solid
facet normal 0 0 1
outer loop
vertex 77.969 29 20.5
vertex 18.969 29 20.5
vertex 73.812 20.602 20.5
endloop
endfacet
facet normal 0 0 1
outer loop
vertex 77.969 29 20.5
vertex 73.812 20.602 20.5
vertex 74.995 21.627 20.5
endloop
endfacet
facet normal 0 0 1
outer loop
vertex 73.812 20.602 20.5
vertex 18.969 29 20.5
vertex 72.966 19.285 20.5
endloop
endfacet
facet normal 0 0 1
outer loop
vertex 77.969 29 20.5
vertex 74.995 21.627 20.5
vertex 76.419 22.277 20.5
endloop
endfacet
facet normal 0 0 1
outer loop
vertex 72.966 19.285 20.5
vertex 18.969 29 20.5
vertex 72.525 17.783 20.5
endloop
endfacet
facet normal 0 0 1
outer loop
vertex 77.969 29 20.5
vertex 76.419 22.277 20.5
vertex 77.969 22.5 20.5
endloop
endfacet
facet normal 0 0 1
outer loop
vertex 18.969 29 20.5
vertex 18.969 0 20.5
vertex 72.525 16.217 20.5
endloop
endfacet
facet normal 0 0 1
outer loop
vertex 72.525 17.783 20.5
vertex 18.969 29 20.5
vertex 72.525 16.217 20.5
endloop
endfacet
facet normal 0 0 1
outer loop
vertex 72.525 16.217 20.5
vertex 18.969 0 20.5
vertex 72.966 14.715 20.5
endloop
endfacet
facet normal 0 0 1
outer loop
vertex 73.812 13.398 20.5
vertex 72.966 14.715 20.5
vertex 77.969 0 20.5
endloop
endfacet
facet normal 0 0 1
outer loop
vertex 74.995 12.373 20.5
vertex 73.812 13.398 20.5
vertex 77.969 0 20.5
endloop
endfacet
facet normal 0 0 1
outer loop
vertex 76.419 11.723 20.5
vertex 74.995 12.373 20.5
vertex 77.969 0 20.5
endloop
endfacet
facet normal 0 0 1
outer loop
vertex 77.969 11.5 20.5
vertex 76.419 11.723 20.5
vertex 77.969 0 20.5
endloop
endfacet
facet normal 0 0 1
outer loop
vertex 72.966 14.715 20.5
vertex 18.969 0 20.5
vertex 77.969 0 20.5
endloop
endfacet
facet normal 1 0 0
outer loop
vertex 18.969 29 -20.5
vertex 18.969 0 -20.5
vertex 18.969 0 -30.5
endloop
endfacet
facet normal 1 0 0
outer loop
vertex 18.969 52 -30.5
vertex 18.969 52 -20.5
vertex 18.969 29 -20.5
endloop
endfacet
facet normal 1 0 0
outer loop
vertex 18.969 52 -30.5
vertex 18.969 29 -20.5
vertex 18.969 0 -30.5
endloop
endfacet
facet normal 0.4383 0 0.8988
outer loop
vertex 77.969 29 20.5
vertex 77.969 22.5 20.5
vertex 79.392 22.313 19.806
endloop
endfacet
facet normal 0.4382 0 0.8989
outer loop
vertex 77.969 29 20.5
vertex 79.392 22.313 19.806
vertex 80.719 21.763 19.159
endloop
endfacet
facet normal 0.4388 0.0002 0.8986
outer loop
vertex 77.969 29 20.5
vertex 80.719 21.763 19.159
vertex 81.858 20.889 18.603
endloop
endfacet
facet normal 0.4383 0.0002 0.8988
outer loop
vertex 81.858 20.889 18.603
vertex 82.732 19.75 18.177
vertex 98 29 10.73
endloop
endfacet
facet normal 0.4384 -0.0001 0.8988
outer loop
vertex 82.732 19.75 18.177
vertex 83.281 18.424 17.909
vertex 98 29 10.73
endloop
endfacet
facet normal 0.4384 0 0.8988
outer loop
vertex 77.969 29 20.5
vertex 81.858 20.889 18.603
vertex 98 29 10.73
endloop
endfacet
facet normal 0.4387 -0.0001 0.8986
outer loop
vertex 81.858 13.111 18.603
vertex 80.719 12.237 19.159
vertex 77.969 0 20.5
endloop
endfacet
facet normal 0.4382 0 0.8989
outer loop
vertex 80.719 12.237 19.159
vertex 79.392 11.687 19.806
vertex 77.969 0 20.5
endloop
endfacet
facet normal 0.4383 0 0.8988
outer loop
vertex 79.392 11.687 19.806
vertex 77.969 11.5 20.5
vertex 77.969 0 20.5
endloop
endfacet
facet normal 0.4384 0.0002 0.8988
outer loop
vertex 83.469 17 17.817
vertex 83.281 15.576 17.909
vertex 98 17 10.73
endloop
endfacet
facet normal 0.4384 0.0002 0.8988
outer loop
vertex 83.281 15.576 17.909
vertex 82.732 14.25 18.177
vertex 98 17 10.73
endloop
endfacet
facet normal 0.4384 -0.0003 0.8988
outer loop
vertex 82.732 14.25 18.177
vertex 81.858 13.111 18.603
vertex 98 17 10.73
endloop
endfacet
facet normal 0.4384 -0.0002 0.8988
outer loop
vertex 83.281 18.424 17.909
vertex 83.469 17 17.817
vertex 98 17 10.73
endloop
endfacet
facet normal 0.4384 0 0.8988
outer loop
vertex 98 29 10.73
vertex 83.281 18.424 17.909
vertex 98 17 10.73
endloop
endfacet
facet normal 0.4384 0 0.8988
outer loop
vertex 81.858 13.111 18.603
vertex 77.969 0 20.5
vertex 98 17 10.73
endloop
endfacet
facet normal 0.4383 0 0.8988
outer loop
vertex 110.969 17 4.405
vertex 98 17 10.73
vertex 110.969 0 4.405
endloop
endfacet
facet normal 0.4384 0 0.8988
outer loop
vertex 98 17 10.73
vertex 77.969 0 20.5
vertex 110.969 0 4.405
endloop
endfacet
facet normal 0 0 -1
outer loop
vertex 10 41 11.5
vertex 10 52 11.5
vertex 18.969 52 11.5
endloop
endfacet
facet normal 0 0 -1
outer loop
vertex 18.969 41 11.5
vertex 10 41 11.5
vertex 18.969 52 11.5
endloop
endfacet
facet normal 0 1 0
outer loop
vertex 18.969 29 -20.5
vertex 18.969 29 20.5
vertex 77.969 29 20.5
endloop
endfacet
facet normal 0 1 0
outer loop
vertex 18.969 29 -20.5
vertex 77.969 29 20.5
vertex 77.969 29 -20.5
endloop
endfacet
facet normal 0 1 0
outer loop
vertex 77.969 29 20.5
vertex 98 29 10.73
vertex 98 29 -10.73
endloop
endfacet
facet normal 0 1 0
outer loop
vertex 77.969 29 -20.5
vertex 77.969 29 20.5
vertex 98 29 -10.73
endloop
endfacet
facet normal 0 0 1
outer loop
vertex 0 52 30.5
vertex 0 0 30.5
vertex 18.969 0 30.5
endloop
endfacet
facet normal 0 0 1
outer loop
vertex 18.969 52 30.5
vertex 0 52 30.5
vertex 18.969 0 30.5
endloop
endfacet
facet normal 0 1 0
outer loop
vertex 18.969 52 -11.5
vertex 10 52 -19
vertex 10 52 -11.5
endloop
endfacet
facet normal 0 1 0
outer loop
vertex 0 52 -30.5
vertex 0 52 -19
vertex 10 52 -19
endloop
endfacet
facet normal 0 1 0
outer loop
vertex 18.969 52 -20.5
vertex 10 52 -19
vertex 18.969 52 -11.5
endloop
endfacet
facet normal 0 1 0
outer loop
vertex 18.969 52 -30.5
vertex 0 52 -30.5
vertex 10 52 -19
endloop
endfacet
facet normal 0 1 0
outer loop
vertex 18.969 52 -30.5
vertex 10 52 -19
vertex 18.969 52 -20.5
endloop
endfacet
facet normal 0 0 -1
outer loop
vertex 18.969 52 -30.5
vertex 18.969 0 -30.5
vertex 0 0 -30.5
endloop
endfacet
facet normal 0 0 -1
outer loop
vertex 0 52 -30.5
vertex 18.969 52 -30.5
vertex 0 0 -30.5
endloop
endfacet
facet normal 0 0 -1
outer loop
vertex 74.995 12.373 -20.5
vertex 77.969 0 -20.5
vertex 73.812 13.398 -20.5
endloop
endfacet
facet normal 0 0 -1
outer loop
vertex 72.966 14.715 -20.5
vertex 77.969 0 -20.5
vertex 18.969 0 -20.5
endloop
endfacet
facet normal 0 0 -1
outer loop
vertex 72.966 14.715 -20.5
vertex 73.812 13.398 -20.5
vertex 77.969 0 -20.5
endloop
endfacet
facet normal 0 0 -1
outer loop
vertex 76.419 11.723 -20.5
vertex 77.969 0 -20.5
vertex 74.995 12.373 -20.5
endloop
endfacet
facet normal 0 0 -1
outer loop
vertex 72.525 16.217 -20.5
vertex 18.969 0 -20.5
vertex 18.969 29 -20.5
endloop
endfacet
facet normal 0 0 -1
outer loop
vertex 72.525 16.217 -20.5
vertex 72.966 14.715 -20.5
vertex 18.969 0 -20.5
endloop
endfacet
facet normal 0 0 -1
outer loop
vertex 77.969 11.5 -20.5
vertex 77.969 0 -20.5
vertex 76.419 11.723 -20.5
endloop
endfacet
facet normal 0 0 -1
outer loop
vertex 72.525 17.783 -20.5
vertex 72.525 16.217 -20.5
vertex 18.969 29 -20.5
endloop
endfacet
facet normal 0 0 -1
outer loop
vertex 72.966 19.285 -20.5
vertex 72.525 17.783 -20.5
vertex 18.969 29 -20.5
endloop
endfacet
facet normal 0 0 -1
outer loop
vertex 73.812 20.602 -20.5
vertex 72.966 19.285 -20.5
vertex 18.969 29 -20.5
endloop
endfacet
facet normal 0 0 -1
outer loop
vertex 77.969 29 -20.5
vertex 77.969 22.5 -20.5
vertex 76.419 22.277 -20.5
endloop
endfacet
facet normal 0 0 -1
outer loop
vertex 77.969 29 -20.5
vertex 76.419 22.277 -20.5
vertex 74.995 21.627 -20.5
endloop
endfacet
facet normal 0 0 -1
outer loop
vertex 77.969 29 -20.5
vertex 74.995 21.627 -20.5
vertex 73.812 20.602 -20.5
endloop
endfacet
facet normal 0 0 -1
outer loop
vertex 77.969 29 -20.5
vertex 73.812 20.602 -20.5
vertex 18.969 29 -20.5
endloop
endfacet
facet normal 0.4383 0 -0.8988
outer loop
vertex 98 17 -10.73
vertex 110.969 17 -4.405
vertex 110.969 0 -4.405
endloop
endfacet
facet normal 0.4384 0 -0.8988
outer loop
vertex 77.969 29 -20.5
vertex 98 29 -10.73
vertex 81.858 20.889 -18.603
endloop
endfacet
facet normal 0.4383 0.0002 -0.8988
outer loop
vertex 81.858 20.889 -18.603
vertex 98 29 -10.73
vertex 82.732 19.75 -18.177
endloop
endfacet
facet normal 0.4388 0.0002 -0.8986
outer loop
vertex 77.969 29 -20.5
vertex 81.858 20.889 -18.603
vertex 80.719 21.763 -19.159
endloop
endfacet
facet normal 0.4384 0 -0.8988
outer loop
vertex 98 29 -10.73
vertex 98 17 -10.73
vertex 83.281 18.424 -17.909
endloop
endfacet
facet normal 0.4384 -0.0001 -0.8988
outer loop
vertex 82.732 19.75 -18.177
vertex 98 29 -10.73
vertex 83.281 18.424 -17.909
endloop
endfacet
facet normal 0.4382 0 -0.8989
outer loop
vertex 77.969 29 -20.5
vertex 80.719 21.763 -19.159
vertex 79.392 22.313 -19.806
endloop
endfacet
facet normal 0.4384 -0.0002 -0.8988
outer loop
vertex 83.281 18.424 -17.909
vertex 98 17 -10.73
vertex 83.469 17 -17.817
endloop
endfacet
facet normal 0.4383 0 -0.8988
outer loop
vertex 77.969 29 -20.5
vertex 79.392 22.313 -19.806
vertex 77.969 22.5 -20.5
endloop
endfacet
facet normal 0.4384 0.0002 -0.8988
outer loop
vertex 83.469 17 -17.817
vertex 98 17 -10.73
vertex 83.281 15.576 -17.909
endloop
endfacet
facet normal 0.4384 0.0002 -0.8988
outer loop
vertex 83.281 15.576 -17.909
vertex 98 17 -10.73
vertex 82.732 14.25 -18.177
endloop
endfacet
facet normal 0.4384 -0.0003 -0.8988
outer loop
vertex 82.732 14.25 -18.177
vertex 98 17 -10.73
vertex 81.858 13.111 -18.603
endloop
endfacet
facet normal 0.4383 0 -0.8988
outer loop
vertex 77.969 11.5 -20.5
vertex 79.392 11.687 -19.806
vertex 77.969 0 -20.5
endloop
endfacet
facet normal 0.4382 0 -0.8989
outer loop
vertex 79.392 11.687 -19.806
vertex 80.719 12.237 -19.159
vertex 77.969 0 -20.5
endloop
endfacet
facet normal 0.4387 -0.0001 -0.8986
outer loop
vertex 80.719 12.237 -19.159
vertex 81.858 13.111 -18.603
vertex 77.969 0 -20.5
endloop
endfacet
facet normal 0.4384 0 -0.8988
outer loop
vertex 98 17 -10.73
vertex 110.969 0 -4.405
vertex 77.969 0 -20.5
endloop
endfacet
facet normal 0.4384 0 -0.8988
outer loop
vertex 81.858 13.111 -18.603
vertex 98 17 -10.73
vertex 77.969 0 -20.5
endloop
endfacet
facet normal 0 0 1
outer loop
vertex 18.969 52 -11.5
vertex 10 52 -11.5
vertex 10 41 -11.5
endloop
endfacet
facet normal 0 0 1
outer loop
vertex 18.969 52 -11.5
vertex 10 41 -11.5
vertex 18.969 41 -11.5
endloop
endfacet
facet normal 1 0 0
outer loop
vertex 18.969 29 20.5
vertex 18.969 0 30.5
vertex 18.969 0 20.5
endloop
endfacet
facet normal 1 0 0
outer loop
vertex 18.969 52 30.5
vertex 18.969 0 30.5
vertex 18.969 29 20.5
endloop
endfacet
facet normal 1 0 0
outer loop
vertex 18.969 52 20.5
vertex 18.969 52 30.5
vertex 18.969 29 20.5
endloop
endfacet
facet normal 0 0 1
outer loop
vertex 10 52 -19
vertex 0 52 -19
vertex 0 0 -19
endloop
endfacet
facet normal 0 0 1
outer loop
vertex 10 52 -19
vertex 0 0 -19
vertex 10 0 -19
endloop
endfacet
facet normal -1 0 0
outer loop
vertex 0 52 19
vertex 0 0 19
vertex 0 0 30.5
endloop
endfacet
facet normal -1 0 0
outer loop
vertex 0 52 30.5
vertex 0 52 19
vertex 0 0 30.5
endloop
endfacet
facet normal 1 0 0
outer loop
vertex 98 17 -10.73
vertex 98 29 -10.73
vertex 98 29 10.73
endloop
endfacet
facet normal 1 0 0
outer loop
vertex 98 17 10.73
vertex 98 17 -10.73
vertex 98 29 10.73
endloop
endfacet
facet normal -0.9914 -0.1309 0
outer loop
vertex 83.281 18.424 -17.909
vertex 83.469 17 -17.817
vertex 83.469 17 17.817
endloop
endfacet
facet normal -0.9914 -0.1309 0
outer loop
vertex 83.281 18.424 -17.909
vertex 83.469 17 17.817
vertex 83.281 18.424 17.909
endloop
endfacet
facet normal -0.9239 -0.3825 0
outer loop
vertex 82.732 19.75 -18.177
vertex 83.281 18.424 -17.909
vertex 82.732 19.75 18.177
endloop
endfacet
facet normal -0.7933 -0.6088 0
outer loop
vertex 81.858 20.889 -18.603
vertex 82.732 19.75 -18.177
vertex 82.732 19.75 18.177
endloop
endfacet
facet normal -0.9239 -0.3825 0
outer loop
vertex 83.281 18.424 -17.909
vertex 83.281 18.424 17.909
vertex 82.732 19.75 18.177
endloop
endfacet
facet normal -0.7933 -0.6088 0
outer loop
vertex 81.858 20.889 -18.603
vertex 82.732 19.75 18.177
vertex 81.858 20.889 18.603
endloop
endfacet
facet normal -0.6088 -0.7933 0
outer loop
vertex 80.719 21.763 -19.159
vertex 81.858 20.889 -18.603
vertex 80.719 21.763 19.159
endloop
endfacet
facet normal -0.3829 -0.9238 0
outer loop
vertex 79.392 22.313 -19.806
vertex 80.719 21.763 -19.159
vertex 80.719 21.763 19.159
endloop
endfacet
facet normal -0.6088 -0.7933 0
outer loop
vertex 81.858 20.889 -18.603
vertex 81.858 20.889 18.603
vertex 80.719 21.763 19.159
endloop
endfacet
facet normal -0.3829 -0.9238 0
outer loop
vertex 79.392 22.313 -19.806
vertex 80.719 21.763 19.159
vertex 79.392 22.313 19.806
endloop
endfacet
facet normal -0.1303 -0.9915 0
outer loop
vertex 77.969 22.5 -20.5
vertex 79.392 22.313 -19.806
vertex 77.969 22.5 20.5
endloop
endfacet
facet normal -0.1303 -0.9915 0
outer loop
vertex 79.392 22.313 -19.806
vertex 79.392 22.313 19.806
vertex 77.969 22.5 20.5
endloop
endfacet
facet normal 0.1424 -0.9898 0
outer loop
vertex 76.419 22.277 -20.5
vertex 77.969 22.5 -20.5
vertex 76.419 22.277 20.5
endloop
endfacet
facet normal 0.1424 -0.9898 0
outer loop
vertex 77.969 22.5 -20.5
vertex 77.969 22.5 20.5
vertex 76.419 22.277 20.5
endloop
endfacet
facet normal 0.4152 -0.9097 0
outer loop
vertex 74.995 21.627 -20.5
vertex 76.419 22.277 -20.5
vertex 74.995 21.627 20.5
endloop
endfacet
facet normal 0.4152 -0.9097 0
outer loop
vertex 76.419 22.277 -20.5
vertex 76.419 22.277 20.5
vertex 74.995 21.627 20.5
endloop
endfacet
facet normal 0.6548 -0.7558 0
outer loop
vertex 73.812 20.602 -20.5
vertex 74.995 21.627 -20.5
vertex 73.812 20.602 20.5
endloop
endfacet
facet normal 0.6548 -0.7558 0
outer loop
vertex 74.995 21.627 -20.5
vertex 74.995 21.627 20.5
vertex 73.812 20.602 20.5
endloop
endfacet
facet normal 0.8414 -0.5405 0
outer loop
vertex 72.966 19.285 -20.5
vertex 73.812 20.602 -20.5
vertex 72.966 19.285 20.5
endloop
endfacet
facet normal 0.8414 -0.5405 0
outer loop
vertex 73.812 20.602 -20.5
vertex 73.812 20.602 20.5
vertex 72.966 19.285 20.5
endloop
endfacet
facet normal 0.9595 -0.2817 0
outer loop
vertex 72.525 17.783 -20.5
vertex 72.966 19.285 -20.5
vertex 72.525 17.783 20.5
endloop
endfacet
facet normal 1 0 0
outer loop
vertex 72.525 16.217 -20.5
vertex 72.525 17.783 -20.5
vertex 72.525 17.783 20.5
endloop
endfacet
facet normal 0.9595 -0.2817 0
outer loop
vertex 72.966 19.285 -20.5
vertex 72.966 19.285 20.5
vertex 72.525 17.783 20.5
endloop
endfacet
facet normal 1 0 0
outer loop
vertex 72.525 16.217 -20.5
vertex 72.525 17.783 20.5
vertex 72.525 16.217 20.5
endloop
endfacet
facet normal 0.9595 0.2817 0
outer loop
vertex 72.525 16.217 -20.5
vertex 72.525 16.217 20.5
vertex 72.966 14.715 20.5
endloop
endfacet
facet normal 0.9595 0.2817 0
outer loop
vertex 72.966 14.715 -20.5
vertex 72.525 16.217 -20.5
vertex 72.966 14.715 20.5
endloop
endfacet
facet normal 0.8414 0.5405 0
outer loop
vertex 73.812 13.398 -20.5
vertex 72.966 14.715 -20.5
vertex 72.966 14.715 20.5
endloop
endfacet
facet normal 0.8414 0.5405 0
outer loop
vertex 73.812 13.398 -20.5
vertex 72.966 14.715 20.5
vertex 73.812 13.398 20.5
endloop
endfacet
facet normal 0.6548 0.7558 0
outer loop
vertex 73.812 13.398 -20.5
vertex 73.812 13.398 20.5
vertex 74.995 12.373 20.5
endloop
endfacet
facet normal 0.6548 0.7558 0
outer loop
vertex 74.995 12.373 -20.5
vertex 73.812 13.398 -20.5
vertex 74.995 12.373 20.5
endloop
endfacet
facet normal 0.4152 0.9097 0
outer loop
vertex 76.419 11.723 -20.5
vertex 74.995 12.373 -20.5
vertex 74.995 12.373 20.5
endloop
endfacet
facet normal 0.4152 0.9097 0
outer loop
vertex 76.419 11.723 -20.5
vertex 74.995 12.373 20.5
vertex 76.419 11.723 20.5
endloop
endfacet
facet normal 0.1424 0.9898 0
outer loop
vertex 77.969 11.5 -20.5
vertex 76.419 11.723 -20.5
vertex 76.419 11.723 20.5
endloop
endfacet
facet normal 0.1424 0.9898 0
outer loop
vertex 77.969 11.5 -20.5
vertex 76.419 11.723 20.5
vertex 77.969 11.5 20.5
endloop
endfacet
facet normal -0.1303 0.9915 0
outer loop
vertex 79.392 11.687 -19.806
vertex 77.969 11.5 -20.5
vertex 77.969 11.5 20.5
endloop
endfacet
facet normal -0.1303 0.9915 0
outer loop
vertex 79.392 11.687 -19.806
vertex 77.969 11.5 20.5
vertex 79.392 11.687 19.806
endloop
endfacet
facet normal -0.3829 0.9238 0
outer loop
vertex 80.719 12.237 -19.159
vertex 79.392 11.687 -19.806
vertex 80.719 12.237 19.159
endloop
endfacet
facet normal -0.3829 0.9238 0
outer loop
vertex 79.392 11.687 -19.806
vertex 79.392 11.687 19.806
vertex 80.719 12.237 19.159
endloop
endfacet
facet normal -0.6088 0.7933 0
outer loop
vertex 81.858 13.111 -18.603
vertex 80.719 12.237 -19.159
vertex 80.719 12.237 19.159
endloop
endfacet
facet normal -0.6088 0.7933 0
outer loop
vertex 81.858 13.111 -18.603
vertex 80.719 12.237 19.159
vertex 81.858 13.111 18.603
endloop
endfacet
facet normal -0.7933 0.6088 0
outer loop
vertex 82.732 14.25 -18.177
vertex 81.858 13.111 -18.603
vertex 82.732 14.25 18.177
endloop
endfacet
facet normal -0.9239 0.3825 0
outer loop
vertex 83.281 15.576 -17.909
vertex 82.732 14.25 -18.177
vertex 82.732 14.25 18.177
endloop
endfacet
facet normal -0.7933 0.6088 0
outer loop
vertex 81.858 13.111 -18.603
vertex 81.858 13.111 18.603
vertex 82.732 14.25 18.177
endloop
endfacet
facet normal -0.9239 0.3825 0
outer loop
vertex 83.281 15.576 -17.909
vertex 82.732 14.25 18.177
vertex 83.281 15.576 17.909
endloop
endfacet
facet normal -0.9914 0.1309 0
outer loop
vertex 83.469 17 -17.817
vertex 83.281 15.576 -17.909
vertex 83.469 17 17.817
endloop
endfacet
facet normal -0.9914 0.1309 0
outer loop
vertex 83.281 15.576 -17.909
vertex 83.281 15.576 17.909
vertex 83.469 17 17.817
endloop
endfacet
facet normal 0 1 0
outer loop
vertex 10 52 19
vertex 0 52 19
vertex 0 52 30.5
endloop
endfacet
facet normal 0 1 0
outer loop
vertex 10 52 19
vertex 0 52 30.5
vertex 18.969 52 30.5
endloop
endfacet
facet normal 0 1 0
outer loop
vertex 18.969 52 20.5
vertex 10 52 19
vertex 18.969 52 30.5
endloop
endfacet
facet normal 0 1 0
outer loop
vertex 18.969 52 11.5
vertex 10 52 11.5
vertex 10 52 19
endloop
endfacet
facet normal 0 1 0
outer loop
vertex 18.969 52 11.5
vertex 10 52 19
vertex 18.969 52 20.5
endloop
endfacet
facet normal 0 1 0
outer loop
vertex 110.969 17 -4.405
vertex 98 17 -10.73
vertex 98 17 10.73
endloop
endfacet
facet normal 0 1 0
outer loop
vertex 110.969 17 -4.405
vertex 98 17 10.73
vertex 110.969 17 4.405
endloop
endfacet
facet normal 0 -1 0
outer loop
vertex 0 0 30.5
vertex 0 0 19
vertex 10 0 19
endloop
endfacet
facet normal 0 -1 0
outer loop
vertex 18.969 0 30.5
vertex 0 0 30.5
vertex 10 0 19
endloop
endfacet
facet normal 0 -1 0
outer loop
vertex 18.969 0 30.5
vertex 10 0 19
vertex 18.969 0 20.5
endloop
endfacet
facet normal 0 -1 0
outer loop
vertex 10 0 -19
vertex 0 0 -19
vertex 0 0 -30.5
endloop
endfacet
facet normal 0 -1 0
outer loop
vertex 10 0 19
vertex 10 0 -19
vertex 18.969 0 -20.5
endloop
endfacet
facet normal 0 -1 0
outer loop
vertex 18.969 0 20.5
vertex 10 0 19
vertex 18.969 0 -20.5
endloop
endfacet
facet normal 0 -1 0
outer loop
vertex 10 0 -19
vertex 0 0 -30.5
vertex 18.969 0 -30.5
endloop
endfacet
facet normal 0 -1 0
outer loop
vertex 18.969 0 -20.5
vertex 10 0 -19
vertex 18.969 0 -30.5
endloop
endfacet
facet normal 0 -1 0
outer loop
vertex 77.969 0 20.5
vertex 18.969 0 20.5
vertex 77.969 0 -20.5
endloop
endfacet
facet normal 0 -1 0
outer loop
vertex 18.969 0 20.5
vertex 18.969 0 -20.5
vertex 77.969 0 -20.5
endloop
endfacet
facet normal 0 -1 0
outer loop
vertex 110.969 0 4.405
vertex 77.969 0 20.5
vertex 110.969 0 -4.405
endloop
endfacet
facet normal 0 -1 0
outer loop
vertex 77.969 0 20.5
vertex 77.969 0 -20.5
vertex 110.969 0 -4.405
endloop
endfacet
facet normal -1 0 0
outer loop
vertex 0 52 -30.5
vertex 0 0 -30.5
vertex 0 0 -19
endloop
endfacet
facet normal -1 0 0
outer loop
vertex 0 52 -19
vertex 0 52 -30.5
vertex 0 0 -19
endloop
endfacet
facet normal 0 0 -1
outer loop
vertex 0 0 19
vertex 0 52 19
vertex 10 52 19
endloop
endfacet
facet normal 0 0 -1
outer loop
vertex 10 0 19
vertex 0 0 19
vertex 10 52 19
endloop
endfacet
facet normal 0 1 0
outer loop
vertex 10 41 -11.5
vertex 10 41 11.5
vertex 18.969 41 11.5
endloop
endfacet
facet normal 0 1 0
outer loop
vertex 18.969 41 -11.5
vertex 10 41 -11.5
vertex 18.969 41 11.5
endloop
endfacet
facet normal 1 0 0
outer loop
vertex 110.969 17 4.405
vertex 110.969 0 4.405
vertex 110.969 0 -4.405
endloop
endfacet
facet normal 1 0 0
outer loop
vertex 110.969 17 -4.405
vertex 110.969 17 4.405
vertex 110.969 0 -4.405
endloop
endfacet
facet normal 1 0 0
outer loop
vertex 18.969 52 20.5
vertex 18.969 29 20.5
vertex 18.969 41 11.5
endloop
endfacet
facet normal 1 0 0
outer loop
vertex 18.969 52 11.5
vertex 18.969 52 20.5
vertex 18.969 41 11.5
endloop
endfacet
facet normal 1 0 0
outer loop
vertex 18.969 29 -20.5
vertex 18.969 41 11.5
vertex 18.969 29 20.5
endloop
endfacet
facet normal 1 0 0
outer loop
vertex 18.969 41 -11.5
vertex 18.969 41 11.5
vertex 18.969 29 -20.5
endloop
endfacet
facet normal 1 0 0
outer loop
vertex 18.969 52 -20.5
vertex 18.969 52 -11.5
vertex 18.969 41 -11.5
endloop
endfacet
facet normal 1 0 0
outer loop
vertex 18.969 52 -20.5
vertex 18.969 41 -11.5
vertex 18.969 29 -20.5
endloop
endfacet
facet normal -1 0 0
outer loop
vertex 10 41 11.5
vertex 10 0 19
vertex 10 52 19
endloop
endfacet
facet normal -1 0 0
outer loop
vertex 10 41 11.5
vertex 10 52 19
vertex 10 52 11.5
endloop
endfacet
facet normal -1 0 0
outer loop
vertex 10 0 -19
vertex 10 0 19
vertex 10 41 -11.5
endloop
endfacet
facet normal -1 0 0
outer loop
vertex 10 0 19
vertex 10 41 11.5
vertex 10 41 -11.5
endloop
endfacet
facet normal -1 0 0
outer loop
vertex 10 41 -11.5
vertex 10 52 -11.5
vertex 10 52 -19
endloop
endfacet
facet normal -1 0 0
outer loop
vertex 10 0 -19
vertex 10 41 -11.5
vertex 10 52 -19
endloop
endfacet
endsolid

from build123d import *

# Parameters (mm, degrees)
BOSS_EXTRUDE1_DEPTH = 52
SKETCH2_W           = 41
SKETCH2_H           = 23
CUT_EXTRUDE1_DEPTH  = 92
SKETCH3_W           = 10
SKETCH3_H           = 52
CUT_EXTRUDE2_DEPTH  = 9.031229
CUT_EXTRUDE3_DEPTH  = 35
SKETCH5_W           = 20
SKETCH5_H           = 38
CUT_EXTRUDE4_DEPTH  = 62
SKETCH6_W           = 9.816407164
SKETCH6_H           = 23
CUT_EXTRUDE5_DEPTH  = 11
SKETCH8_R           = 5.5
CUT_EXTRUDE6_DEPTH  = 52


with BuildPart() as part:
    # Sketch1 → Boss-Extrude1 (new body)
    with BuildSketch(Plane(origin=(0, 0, 0), x_dir=(1, 0, 0), z_dir=(0, 1, 0))):
        Polygon((0, 30.5), (0, -30.5), (28, -30.5), (28, -20.5), (77.968771248, -20.5), (110.968771248, -4.404824577), (110.968771248, 4.404824577), (77.968771248, 20.5), (28, 20.5), (28, 30.5), align=None)
    extrude(amount=BOSS_EXTRUDE1_DEPTH)

    # Sketch2 → Cut-Extrude1 (cut)
    with BuildSketch(Plane(origin=(110.968771248, 0, 0), x_dir=(0, 0, -1), z_dir=(1, 0, 0))):
        with Locations((0, 40.5)):
            Rectangle(SKETCH2_W, SKETCH2_H)
    extrude(amount=-CUT_EXTRUDE1_DEPTH, mode=Mode.SUBTRACT)

    # Sketch3 → Cut-Extrude2 (cut)
    with BuildSketch(Plane(origin=(28, 0, 0), x_dir=(0, 0, -1), z_dir=(1, 0, 0))):
        with Locations((-25.5, 26)):
            Rectangle(SKETCH3_W, SKETCH3_H)
        with Locations((25.5, 26)):
            Rectangle(SKETCH3_W, SKETCH3_H)
    extrude(amount=-CUT_EXTRUDE2_DEPTH, mode=Mode.SUBTRACT)

    # Sketch4 → Cut-Extrude3 (cut)
    with BuildSketch(Plane(origin=(0, 52, 0), x_dir=(1, 0, 0), z_dir=(0, 1, 0))):
        Polygon((120, 0), (120, 12.404317322), (98, 12.404317322), (98, -13.293630883), (120, -13.293630883), align=None)
    extrude(amount=-CUT_EXTRUDE3_DEPTH, mode=Mode.SUBTRACT)

    # Sketch5 → Cut-Extrude4 (cut)
    with BuildSketch(Plane(origin=(0, 52, 0), x_dir=(1, 0, 0), z_dir=(0, 1, 0))):
        Rectangle(SKETCH5_W, SKETCH5_H)
    extrude(amount=-CUT_EXTRUDE4_DEPTH, mode=Mode.SUBTRACT)

    # Sketch6 → Cut-Extrude5 (cut)
    with BuildSketch(Plane(origin=(0, 52, 0), x_dir=(1, 0, 0), z_dir=(0, 1, 0))):
        with Locations((14.060567666, 0)):
            Rectangle(SKETCH6_W, SKETCH6_H)
    extrude(amount=-CUT_EXTRUDE5_DEPTH, mode=Mode.SUBTRACT)

    # Sketch8 → Cut-Extrude6 (cut, through all)
    with BuildSketch(Plane.XY.offset(20.5)):
        with Locations((77.968771248, 17)):
            Circle(SKETCH8_R)
    extrude(amount=-CUT_EXTRUDE6_DEPTH, mode=Mode.SUBTRACT)


solid = part.part
